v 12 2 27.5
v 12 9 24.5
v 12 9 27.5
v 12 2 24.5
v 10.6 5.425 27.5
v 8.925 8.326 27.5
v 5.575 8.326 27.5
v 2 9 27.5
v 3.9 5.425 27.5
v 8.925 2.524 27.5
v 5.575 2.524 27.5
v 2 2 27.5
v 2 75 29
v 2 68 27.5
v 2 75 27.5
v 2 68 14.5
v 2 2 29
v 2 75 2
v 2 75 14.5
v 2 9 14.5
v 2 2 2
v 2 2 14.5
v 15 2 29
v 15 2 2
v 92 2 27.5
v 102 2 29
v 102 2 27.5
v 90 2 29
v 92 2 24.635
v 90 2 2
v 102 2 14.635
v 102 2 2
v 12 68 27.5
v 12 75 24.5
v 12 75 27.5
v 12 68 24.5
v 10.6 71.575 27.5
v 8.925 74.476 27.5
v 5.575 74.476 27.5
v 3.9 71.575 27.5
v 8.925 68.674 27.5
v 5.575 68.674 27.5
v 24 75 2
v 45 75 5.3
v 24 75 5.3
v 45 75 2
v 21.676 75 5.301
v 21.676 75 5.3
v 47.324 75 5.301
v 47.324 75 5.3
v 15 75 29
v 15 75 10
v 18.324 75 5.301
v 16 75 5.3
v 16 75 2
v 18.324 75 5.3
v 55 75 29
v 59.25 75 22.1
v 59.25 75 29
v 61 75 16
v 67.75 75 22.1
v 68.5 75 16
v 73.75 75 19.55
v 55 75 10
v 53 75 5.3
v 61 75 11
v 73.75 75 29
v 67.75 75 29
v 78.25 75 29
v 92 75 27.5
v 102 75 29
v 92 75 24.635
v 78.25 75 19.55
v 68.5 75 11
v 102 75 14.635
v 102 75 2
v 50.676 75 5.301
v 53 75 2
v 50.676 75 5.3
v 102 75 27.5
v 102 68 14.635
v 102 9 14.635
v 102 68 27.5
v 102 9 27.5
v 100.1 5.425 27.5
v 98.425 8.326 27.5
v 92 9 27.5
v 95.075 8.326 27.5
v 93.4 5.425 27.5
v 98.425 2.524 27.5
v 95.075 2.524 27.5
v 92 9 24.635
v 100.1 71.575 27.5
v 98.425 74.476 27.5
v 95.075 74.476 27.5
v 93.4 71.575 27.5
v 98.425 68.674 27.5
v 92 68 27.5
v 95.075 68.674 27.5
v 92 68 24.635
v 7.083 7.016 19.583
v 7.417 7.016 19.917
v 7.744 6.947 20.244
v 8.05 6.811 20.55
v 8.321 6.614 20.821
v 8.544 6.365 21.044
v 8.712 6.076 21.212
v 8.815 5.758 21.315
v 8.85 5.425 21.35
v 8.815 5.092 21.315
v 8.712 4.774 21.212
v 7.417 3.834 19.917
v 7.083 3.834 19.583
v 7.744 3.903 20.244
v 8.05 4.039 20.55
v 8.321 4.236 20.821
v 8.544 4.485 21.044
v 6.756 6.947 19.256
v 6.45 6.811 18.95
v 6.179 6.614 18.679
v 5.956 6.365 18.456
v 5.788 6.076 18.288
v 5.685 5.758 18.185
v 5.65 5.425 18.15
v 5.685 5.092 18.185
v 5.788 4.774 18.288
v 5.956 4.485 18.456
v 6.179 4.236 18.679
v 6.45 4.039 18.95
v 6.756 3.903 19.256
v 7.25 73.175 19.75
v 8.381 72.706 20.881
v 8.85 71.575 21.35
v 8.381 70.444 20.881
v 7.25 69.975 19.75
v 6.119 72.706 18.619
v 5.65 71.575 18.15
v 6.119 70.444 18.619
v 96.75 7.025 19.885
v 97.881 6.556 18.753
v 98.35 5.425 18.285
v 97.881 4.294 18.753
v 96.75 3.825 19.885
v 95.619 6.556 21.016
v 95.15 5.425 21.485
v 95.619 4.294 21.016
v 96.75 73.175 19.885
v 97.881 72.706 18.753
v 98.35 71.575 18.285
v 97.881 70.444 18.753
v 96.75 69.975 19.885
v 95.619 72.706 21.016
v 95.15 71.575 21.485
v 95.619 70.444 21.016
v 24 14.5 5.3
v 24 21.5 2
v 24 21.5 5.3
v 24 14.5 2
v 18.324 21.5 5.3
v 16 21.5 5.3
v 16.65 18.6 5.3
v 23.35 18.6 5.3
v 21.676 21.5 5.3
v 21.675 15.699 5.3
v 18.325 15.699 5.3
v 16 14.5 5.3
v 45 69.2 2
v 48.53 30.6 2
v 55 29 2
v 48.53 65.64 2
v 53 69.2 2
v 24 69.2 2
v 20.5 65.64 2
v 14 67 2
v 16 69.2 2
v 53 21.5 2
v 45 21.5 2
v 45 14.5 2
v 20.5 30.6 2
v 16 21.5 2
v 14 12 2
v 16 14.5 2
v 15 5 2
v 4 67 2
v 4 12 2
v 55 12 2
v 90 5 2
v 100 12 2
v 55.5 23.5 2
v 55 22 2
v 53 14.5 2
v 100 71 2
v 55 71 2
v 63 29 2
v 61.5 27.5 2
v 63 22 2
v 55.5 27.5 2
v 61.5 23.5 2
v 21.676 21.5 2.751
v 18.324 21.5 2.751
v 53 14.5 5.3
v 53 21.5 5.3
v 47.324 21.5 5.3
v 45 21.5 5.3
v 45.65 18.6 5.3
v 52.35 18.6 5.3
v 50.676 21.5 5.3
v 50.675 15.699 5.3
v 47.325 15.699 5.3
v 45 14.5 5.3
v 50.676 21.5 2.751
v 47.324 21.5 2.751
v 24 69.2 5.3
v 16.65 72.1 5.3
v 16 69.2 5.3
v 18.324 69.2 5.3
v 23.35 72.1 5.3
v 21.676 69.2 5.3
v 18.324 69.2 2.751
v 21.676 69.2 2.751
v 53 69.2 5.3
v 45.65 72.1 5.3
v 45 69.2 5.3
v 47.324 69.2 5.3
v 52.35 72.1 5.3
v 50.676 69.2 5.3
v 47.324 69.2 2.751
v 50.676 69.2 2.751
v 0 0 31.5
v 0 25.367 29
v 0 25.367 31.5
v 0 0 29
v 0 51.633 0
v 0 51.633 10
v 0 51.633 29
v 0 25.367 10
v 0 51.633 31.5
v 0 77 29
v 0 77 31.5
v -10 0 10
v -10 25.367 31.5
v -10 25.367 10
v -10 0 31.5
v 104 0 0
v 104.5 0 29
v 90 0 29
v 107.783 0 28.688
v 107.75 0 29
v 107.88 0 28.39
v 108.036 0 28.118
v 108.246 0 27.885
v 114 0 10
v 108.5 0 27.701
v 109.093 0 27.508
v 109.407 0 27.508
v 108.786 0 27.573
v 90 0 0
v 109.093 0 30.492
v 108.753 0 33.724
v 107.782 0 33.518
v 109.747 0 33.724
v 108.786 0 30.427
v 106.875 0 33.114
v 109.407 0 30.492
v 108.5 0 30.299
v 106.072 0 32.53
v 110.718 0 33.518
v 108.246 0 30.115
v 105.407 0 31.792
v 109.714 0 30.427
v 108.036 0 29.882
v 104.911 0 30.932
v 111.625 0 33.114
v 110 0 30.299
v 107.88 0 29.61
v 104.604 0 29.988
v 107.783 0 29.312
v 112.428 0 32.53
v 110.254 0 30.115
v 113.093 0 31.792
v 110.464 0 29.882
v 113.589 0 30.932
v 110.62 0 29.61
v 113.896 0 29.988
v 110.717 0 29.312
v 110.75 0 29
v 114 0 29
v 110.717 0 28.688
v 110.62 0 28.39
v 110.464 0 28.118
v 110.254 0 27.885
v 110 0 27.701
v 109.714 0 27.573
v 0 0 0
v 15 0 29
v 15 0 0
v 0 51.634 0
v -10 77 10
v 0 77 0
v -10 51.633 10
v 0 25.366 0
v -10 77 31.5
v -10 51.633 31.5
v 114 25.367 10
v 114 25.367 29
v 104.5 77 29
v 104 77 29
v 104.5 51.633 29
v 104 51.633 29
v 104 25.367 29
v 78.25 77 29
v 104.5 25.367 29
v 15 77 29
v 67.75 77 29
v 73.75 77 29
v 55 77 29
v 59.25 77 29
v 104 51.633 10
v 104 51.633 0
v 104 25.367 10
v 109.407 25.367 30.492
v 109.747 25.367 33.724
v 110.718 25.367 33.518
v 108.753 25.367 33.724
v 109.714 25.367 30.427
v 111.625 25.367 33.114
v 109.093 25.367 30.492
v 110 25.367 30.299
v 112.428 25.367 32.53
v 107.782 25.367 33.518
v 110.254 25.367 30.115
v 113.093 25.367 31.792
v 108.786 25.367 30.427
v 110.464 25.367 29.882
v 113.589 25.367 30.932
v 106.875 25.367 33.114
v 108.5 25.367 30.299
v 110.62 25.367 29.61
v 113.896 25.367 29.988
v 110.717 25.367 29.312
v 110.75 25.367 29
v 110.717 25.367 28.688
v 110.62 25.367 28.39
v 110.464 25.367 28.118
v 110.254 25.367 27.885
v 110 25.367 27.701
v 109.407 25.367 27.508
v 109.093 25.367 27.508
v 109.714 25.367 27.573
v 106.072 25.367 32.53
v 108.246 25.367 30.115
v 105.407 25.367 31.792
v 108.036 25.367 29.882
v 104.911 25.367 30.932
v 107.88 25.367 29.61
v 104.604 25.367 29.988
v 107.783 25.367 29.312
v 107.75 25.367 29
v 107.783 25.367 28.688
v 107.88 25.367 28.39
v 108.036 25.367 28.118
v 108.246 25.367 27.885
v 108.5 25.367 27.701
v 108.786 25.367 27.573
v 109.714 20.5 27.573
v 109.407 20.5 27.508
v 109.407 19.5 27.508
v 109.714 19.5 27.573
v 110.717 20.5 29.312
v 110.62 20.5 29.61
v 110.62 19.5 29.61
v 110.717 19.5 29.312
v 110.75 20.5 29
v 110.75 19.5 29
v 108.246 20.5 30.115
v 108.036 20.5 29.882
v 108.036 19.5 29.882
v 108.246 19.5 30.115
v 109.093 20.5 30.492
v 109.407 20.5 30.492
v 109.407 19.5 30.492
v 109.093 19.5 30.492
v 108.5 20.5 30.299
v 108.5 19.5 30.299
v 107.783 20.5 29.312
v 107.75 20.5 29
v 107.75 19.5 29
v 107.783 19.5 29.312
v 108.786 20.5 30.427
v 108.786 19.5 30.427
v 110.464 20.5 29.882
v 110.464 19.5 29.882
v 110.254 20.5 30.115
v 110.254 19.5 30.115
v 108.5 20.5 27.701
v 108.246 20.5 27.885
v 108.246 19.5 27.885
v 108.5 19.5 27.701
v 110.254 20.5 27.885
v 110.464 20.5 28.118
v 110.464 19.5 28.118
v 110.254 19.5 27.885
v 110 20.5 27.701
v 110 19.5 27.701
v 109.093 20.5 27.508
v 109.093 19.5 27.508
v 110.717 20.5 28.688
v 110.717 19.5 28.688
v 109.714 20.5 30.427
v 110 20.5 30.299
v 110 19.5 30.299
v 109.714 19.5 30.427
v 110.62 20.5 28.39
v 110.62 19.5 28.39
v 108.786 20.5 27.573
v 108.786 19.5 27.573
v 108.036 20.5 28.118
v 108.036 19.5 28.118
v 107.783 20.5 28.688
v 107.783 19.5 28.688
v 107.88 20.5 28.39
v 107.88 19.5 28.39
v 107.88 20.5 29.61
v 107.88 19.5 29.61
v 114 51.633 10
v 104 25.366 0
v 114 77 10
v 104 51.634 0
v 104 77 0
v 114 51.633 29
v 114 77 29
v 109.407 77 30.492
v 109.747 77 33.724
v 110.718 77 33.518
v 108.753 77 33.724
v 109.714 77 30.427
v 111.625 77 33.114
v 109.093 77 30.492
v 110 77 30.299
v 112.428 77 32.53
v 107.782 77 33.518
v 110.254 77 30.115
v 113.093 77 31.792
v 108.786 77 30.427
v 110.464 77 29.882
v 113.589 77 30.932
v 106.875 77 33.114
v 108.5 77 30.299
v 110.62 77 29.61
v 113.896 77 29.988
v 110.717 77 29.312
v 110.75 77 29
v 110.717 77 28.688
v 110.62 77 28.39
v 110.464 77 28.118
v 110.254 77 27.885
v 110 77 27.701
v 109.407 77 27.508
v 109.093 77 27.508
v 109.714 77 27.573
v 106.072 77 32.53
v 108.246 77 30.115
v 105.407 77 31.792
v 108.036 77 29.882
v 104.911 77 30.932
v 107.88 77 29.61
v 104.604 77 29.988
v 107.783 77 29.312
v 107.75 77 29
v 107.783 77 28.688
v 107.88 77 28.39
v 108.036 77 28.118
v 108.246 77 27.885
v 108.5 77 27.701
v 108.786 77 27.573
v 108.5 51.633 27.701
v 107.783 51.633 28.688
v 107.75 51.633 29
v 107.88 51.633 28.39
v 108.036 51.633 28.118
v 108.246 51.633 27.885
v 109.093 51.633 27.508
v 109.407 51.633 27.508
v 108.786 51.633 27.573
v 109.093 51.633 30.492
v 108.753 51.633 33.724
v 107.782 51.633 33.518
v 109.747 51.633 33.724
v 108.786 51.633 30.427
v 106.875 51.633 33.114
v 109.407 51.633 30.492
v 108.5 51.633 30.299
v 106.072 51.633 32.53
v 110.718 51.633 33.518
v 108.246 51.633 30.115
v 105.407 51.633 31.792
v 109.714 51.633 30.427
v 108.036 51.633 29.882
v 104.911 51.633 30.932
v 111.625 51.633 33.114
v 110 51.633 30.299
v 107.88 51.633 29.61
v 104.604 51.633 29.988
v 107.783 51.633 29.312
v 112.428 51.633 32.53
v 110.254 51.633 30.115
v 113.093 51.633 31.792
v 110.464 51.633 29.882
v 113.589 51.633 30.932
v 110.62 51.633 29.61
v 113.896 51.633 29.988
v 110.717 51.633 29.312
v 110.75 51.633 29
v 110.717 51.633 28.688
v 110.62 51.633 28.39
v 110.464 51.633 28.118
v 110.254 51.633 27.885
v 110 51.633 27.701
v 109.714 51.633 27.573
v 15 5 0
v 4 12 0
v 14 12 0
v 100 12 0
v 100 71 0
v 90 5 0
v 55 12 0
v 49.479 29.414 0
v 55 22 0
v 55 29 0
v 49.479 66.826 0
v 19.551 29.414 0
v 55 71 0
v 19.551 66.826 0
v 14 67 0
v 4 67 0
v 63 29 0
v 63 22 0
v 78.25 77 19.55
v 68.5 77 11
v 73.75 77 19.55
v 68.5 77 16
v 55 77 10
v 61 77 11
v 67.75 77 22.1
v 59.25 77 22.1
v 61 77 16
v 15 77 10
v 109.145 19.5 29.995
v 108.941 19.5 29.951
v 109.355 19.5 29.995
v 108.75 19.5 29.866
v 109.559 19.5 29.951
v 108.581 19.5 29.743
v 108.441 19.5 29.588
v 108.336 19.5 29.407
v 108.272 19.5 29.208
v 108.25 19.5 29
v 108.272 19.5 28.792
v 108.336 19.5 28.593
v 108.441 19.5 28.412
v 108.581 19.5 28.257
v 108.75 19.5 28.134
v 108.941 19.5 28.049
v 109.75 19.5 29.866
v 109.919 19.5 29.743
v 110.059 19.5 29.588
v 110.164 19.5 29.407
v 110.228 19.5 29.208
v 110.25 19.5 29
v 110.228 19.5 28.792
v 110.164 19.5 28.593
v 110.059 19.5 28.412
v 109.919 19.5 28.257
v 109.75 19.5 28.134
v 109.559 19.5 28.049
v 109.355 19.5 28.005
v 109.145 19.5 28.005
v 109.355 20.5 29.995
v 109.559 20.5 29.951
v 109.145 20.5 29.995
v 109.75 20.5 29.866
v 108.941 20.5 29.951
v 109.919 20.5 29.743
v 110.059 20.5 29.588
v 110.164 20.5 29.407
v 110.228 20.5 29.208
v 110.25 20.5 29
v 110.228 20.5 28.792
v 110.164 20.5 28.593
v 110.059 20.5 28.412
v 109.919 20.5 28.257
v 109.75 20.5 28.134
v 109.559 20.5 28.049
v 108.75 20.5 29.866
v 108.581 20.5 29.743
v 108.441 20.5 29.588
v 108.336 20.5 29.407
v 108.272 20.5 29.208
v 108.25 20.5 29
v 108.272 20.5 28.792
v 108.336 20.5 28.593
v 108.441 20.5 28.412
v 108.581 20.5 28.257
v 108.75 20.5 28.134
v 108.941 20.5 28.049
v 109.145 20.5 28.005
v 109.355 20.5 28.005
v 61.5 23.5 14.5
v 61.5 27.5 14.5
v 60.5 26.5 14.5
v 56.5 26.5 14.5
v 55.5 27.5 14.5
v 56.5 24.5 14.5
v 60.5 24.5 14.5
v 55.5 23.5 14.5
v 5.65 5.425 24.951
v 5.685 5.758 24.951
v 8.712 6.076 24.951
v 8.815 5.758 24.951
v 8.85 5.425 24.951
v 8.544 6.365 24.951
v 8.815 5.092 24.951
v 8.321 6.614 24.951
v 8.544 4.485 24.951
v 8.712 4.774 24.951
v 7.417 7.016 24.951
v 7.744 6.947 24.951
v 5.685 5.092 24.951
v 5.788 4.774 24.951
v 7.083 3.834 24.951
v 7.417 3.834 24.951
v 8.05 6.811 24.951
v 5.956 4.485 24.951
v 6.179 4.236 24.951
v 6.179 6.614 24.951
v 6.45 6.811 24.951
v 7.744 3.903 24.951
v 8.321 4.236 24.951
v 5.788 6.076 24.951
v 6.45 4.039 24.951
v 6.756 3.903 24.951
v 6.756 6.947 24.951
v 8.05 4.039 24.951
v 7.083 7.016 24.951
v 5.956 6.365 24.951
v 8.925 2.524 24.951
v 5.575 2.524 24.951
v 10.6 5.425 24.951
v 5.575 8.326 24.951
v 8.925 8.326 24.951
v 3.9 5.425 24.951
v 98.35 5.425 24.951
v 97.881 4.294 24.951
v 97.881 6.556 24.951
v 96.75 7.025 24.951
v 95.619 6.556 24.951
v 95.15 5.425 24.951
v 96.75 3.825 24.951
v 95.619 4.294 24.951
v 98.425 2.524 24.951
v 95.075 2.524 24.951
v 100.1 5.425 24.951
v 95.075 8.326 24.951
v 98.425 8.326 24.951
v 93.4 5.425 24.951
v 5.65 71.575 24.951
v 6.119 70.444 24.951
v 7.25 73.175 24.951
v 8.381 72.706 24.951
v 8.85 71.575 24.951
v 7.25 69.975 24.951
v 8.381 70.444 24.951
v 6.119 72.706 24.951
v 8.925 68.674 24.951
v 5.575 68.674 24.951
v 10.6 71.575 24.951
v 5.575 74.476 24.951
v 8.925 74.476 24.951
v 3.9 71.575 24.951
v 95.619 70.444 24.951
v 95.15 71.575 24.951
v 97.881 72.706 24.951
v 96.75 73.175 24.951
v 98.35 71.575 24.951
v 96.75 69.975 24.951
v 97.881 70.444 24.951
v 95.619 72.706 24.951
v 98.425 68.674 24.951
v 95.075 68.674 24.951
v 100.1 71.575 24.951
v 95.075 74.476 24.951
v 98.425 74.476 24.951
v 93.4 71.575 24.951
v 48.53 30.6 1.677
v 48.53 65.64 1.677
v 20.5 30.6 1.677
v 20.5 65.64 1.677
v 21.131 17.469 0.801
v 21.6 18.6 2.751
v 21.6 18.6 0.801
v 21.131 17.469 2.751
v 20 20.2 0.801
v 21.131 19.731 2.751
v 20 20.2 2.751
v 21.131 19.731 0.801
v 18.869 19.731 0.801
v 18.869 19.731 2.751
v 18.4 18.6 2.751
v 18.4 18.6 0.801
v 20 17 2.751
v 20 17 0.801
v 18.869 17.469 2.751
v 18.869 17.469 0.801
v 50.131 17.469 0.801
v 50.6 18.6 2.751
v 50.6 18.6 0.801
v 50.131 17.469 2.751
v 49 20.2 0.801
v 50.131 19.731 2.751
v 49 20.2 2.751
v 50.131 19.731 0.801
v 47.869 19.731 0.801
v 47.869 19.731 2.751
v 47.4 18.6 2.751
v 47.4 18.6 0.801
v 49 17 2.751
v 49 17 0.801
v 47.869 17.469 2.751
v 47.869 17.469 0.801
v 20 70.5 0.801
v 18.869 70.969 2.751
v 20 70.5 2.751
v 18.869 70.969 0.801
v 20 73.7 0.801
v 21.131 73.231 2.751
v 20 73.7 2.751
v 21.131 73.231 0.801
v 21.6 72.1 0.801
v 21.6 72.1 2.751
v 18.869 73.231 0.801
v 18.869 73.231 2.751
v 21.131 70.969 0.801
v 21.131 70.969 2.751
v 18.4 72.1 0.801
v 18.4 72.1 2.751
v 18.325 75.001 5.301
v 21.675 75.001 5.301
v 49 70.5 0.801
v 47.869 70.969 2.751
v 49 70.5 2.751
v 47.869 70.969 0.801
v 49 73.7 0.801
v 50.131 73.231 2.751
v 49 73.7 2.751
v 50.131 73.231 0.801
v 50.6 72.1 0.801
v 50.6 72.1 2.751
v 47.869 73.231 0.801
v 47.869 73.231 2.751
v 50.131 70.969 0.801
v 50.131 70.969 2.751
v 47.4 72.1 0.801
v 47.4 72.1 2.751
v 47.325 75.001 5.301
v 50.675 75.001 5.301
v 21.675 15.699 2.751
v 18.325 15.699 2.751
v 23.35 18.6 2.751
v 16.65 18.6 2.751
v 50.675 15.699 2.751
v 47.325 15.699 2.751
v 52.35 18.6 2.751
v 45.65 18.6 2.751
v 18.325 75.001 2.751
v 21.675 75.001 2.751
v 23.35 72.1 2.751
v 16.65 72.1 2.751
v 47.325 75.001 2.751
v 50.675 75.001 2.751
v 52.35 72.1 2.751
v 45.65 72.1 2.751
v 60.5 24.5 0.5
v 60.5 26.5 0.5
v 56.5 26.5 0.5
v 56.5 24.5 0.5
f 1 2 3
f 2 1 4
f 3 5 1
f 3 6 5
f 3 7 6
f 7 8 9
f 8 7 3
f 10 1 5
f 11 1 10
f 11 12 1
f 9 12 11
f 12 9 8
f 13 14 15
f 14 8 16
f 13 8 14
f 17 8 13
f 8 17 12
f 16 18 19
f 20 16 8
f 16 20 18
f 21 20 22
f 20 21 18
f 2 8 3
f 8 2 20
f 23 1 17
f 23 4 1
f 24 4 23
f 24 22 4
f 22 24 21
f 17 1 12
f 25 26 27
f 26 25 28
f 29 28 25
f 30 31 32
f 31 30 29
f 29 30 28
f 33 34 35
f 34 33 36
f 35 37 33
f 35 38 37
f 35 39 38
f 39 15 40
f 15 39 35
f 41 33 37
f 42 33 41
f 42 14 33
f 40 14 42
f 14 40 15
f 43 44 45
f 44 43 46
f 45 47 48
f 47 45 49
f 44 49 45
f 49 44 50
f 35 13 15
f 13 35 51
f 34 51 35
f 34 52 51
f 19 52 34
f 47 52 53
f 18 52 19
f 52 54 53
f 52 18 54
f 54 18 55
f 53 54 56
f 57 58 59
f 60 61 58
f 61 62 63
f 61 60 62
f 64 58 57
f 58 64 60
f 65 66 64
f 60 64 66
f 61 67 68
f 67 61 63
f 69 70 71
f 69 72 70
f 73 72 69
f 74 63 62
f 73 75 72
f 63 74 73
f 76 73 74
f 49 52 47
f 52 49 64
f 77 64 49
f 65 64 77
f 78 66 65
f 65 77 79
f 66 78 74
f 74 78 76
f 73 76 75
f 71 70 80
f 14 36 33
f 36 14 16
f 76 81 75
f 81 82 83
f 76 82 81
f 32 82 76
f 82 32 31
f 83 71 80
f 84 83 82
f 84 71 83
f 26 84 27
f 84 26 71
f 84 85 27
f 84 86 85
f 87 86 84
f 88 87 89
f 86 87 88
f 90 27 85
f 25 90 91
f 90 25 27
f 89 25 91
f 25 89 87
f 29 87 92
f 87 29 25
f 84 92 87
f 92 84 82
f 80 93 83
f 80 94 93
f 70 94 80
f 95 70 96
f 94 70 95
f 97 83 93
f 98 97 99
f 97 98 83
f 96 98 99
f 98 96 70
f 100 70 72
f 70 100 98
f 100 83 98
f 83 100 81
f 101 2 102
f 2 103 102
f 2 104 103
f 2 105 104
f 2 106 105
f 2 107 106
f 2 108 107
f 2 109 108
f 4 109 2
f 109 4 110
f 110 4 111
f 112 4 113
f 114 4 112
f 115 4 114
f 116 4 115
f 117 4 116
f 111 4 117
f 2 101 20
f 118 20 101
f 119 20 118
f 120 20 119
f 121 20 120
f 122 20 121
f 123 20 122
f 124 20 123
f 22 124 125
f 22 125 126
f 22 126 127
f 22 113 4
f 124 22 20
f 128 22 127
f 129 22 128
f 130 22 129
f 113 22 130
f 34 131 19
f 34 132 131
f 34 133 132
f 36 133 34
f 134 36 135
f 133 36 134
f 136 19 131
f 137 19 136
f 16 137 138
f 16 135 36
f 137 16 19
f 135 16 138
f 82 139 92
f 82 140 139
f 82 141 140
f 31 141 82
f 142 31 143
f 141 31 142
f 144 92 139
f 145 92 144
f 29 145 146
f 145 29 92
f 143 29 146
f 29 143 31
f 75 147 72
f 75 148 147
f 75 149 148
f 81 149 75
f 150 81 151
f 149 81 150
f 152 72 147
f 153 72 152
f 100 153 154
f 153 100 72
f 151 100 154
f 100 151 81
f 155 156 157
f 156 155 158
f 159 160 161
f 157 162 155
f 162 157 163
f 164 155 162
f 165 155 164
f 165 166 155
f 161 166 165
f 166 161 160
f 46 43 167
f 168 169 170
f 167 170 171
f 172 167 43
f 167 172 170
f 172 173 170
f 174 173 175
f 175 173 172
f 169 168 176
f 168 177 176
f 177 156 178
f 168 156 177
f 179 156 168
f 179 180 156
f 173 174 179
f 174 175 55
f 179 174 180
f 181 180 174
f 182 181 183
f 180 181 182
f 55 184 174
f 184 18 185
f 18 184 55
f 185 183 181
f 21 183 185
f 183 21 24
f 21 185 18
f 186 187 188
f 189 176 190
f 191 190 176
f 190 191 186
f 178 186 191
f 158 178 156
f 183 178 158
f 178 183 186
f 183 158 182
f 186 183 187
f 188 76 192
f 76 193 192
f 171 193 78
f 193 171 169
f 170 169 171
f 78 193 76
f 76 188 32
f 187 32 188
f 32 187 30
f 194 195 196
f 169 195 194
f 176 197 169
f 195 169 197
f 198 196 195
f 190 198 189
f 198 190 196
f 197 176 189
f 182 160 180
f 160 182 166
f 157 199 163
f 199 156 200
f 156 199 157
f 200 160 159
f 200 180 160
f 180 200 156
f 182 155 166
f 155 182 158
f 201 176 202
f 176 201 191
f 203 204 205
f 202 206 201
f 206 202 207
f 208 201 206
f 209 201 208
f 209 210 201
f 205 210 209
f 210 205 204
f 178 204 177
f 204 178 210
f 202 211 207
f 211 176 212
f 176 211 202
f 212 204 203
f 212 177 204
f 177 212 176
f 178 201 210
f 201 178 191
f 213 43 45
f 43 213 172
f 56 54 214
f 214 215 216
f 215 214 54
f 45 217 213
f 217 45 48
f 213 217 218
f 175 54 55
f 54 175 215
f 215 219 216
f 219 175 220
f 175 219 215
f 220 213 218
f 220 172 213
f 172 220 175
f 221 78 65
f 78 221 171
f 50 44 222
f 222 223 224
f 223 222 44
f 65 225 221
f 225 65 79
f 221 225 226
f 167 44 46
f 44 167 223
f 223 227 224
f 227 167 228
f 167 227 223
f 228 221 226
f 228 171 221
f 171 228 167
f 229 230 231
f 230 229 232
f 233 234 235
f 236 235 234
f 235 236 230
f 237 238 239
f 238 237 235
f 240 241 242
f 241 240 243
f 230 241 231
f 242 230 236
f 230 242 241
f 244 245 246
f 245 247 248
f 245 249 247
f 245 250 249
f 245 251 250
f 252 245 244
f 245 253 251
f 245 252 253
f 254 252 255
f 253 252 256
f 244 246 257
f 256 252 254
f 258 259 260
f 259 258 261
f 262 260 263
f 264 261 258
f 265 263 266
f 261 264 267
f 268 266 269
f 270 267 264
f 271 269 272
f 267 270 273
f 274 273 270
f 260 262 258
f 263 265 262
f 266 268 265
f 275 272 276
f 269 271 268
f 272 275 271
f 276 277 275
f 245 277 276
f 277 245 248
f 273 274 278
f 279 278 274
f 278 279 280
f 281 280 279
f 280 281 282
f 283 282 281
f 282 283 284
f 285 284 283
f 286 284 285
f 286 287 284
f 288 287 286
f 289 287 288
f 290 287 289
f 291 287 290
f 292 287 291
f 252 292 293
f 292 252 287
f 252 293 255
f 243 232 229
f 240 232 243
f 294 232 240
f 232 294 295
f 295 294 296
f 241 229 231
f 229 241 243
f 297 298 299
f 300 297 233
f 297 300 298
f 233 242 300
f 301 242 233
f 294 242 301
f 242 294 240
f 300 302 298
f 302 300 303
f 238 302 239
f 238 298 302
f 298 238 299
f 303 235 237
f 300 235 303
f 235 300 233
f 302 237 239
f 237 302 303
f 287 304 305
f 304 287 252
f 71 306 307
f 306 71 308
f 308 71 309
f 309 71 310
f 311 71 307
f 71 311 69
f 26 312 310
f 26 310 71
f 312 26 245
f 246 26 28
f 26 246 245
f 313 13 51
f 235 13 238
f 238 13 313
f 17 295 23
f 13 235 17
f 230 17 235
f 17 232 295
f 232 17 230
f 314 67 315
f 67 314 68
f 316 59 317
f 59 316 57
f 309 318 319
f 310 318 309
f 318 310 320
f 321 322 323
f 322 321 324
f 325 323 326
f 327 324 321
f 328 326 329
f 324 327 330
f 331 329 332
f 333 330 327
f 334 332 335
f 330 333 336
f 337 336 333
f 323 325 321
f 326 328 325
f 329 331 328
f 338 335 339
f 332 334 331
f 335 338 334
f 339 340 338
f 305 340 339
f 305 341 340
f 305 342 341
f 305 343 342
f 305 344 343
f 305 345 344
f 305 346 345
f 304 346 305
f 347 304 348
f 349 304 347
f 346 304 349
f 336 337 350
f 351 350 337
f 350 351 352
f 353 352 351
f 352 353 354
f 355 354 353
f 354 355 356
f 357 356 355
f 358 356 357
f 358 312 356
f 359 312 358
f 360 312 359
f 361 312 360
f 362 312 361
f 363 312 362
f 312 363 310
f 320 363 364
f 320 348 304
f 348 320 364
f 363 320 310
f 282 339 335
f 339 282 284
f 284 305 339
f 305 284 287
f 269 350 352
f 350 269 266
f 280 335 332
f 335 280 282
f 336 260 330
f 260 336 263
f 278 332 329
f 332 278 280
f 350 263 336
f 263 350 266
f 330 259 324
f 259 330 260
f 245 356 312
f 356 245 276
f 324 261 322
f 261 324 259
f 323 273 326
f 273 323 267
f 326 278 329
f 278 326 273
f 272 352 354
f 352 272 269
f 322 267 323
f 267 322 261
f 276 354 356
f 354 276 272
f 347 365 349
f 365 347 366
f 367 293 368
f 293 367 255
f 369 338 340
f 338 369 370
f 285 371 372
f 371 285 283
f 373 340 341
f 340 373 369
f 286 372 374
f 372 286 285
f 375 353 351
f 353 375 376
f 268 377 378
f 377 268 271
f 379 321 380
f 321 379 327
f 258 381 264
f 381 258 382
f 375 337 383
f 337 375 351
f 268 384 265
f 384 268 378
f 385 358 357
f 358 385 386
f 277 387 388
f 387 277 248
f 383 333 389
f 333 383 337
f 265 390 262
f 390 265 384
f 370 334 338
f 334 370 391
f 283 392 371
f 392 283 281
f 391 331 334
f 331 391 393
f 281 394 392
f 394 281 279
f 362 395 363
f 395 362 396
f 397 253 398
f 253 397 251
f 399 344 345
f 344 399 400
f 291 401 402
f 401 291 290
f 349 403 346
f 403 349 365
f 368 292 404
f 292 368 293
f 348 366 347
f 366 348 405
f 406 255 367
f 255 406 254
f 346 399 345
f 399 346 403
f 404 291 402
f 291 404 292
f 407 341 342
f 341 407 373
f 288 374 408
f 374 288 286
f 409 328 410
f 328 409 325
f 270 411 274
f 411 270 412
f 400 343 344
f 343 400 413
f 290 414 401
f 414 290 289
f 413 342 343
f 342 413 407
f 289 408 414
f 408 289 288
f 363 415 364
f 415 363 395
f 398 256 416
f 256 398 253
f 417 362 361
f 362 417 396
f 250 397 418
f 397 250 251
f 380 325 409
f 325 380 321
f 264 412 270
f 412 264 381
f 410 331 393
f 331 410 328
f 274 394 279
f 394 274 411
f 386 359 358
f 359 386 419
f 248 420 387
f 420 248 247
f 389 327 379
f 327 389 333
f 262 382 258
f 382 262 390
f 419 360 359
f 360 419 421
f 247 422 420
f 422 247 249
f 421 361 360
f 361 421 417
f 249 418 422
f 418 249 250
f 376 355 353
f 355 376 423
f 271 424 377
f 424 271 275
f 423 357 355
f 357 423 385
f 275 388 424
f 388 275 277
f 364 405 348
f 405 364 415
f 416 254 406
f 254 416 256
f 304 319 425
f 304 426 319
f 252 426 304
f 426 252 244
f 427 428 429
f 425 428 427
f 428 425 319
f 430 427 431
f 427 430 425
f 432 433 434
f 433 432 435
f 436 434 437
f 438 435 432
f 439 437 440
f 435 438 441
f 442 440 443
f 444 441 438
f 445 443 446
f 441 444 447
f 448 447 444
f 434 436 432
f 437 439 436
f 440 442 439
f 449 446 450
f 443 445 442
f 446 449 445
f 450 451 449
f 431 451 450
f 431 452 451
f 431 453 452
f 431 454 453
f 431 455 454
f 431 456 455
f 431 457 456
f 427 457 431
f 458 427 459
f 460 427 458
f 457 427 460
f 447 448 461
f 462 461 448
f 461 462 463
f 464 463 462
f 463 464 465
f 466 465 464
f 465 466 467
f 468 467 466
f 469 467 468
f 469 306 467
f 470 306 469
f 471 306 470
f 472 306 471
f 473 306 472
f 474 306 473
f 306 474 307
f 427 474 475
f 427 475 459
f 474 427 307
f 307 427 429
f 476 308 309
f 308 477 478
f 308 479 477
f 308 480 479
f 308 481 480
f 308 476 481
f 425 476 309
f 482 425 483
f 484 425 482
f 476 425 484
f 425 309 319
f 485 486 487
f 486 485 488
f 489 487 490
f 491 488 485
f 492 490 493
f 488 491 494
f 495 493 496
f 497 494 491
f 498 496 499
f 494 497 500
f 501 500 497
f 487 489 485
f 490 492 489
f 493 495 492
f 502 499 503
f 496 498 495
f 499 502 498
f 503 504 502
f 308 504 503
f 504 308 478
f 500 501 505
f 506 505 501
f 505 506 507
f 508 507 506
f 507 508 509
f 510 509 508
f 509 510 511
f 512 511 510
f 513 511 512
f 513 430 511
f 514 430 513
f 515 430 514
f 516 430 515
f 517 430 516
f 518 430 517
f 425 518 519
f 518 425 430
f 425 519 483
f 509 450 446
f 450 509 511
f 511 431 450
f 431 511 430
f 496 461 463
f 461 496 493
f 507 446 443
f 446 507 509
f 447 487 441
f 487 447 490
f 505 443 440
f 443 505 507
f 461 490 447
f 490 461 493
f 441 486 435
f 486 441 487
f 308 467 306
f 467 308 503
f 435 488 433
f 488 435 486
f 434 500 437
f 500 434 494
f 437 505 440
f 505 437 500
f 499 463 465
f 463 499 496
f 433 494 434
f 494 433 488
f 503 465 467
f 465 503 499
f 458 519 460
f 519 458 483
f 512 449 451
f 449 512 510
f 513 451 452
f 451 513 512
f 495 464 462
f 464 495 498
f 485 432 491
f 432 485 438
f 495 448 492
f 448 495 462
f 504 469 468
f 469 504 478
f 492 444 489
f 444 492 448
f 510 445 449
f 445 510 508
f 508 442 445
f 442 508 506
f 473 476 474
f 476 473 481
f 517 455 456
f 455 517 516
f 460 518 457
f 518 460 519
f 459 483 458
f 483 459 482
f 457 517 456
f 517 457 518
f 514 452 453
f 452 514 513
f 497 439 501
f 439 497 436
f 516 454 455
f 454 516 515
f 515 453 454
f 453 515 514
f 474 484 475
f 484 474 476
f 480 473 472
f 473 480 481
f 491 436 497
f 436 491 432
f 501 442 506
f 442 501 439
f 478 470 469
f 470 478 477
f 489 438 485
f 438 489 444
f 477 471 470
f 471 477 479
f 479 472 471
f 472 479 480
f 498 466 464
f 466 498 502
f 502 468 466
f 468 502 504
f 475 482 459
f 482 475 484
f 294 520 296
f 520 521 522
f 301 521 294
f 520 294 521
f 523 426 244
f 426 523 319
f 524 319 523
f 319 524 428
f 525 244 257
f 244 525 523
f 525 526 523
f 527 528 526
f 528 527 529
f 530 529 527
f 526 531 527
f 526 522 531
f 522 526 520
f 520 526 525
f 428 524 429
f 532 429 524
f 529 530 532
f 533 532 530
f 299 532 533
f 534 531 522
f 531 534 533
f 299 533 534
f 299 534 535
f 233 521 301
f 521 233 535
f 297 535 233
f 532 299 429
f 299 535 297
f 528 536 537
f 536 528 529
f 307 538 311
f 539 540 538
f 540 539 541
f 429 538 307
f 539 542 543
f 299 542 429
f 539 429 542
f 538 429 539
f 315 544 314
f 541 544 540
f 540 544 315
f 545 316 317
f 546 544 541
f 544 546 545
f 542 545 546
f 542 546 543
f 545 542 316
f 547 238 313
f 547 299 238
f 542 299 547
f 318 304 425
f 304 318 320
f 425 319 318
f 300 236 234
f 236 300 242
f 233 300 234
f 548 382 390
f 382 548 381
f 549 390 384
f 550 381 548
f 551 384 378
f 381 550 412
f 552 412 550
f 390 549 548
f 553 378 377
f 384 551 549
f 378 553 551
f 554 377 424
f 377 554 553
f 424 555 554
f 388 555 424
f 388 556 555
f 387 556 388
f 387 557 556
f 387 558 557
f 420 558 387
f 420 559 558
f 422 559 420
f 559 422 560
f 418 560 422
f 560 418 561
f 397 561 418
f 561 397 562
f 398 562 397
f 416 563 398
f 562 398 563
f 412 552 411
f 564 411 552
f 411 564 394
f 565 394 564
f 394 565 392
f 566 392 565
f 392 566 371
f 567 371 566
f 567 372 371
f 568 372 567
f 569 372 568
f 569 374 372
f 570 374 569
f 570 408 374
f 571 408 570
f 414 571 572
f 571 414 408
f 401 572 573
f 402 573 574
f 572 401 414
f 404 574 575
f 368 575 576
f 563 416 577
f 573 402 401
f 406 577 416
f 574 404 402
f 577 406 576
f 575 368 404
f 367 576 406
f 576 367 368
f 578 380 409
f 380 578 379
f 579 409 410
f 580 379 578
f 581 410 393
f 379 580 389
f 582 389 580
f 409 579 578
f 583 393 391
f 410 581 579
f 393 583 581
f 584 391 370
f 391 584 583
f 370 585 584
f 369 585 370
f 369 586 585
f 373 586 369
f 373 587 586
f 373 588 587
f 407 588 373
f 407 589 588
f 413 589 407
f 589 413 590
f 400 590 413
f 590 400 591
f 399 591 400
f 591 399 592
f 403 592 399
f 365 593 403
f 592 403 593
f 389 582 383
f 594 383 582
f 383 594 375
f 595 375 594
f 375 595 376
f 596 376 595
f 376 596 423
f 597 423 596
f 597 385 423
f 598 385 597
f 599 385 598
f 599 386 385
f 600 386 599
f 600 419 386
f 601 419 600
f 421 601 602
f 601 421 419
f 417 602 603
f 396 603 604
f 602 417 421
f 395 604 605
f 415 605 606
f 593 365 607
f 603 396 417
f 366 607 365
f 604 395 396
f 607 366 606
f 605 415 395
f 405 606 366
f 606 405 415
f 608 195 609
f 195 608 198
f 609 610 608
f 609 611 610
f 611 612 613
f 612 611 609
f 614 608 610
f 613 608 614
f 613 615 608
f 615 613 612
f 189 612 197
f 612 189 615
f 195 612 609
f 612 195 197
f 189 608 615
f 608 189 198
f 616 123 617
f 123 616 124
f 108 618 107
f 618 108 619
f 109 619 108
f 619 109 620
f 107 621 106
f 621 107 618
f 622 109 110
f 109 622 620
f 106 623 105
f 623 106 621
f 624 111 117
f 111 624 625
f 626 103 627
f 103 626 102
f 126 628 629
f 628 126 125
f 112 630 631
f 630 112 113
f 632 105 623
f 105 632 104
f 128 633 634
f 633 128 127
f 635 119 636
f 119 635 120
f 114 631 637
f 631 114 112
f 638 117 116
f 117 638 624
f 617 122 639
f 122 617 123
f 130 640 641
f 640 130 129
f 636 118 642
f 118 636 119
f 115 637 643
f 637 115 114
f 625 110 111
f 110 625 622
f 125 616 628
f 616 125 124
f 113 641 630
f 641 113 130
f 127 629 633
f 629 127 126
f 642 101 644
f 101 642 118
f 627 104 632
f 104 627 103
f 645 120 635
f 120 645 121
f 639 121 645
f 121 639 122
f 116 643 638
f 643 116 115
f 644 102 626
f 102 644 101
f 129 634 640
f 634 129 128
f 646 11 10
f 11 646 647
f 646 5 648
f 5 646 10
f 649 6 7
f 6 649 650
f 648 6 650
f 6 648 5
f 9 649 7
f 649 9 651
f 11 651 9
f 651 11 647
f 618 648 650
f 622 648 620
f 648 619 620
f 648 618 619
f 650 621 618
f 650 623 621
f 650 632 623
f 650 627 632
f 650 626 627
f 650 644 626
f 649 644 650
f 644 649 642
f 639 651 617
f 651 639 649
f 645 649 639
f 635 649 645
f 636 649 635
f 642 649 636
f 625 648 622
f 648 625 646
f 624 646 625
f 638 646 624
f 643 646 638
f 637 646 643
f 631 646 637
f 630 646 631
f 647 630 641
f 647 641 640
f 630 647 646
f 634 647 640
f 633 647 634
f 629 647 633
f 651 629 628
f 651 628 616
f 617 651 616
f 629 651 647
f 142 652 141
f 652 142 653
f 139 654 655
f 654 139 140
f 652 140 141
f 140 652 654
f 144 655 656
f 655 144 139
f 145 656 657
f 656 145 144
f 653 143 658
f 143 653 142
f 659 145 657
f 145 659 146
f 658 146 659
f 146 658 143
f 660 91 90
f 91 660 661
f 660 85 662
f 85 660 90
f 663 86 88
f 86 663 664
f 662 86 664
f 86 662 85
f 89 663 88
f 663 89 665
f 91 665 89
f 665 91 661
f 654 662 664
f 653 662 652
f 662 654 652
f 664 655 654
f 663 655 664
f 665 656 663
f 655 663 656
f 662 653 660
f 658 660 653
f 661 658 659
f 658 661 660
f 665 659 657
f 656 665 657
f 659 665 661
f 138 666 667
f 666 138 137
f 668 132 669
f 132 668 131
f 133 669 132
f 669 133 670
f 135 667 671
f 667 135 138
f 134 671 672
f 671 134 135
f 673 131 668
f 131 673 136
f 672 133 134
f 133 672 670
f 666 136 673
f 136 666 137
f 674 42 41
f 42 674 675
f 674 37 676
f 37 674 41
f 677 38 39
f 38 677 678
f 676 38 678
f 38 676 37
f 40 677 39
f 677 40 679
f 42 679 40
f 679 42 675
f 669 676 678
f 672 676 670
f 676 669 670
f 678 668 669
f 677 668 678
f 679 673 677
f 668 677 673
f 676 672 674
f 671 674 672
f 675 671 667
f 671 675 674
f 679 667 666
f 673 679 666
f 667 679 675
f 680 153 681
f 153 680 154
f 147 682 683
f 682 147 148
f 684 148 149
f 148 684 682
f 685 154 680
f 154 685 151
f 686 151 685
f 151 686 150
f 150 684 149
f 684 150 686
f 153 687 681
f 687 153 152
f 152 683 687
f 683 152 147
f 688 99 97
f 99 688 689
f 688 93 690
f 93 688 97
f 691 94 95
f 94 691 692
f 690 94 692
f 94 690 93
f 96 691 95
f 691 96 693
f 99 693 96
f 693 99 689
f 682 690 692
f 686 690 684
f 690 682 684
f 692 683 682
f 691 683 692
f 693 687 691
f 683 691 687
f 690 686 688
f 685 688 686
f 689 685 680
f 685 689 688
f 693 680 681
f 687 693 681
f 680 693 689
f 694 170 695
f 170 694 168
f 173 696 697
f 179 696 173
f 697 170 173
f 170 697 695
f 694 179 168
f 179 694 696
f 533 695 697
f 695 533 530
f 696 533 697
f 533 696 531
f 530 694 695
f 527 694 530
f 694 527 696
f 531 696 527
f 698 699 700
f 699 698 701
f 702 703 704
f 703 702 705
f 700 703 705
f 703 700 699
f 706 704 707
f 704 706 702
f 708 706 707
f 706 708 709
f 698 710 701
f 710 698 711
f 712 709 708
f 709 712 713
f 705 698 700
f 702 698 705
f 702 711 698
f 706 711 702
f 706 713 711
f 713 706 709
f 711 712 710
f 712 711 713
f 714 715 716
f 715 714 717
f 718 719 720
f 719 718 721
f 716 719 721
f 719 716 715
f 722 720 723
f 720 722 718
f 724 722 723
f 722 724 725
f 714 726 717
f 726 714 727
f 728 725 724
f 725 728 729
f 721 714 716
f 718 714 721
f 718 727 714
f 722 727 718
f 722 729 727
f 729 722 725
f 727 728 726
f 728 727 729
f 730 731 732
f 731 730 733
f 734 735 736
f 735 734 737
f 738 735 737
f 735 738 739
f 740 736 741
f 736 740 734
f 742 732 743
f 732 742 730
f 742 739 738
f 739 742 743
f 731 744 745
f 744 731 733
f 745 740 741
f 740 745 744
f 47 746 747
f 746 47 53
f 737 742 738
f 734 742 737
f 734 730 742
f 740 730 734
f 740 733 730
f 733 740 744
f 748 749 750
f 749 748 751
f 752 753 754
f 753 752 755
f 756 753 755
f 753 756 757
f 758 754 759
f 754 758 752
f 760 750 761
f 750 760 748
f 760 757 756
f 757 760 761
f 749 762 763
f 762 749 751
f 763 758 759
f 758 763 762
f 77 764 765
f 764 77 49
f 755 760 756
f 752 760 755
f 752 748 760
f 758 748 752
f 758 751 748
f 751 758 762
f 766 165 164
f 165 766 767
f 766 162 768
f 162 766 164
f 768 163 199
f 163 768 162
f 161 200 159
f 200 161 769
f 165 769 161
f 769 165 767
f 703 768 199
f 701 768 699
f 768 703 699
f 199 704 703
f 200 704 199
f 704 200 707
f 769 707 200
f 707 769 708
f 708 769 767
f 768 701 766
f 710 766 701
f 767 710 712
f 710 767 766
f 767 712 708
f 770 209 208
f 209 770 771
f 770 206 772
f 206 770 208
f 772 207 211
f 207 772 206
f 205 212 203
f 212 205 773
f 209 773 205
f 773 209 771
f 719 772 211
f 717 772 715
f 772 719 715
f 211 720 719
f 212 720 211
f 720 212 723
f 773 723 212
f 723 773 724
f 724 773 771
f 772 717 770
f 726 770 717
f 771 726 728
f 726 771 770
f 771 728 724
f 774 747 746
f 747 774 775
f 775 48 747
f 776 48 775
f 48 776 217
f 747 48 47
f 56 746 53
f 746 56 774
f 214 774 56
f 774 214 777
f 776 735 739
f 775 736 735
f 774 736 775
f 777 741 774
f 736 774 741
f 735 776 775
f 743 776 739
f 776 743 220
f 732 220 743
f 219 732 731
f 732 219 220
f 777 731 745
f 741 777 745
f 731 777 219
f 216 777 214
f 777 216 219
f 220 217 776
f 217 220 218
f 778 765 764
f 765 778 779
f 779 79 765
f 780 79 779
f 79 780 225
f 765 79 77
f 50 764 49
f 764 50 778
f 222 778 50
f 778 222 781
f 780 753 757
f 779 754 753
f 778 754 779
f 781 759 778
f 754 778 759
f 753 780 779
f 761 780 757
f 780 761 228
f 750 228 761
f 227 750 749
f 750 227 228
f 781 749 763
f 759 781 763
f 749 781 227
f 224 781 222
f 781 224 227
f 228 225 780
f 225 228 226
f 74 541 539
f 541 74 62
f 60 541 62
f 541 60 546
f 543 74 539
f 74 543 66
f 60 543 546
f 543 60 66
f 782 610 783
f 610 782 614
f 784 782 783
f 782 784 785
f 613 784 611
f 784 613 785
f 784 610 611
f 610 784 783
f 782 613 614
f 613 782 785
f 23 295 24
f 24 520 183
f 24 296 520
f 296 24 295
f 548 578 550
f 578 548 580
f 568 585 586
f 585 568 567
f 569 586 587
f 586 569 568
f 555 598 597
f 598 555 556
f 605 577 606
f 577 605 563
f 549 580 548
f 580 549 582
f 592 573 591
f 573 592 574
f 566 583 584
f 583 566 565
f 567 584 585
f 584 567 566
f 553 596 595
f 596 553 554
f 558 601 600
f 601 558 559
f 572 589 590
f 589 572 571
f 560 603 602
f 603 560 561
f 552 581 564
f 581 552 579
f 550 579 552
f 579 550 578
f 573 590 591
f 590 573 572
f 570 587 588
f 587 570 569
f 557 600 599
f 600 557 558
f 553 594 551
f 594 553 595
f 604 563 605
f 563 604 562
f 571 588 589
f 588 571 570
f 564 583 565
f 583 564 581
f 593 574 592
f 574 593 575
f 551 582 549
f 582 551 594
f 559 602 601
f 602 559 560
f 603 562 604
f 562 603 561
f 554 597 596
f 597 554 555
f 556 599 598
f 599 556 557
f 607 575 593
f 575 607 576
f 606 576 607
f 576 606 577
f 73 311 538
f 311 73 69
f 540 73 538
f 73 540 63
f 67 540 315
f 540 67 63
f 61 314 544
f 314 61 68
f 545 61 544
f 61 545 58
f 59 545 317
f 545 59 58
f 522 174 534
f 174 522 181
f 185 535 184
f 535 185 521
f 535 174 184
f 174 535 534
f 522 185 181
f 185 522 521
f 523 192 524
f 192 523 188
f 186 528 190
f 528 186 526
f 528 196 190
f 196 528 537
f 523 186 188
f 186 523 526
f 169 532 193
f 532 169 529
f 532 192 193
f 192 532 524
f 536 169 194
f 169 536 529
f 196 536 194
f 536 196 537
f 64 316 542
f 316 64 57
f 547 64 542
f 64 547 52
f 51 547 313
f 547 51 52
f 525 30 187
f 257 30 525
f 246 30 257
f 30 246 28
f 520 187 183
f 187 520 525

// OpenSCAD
//
// ktBOX1
//
//


gap1 = 0.001;
gap2 = 0.002;

panel_thick = 2;
front_x = 95+5+panel_thick*2;
front_y = 72+1+panel_thick*2;
front_z = 25+panel_thick;
rear_x = front_x;
rear_y = front_y;
rear_z = 13+panel_thick;

hinge_x = 10;
hinge_y = front_y/3-0.3;
hinge_hole = 1.1+0.4;
hook_x = 10;
hook_y = front_y/3-0.3;
hook_z = 2.5;

board_thick = 1.5;
board_hole_x = 89.5;
board_hole_y = 66.15;

lcd_w = 28.03;
lcd_h = 35.04;
lcd_hole_x = 29;
lcd_hole_y = 53.5;
lcd_slope = 0.755;
lcd_gap = 3.3;

A = 1;
B = 0;//1;
C = 0;//1;



if( A ){
difference(){
    union(){
        //color( "Blue" )
        {
            cube( [front_x, front_y, panel_thick] );
            wall_x( 0, 0, 0, front_z );
            wall_x( 0, front_y-panel_thick, 0, front_z );
            wall_y( 0, 0, 0, front_z );
            wall_y( front_x-panel_thick, 0, 0, front_z );
            board_base( 0, 0, 0 );
            
            lcd_base( 20.5, 30.6, panel_thick );
            
            hook( -10, 0, 0, front_z );
            hook( -10, front_y-hook_y, 0, front_z );
            hinge( front_x, 0, 0, front_z );
            hinge( front_x, front_y-hinge_y, 0, front_z );
            translate( [front_x, hinge_y, 0] )
            cube( [10, front_y-hinge_y*2, 10] );
            translate( [-10, hinge_y, 0] )
            cube( [10, front_y-hinge_y*2, 10] );
            
            //stopper
            translate( [front_x+10/2+0.25, 20, front_z+panel_thick] )
            rotate( [90, 0, 0] )
            cylinder( 1, 2, 2, center=true, $fn=30 );
            
            //LED
            translate( [63.5, 0, 0] ){
                translate( [-7-1, front_y-15-37.5-1, panel_thick] )
                cube( [6, 4, 12.5] );
            }
        }
    }
    translate( [30/2, -gap1, front_z+panel_thick-10+gap1] )
    cube( [front_x-30, panel_thick+gap2, 10] );
    
    board_hole( (front_x-board_hole_x)/2, (front_y-board_hole_y)/2, front_z+panel_thick-board_thick);

    lcd_window( 20.5, 30.6 );
    lcd_hole( 20.5, 30.6, panel_thick );

    translate( [front_x+10, hinge_y-gap1, -10] )
    rotate( [0, -45, 0] )
    cube( [10*sqrt(2), front_y-hinge_y*2+gap2, 10*sqrt(2)] );
    translate( [-10, hinge_y-gap1, -10] )
    rotate( [0, -45, 0] )
    cube( [10*sqrt(2), front_y-hinge_y*2+gap2, 10*sqrt(2)] );
    
    //stopper
    translate( [front_x+10/2+0.25, 20, front_z+panel_thick] )
    rotate( [90, 0, 0] )
    cylinder( 1+gap2, 1, 1, center=true, $fn=30 );
    
    translate( [63.5, 0, 0] ){
        //USB
        translate( [1.25, front_y-panel_thick/2+gap1, 13.5] )
        cube( [7.5, panel_thick+gap2*2, 5], center=true );
        
        //SW
        /*translate( [20, front_y-10.5, panel_thick/2] ){
            cube( [10+0.6, 6, panel_thick+gap2*2], center=true );
            translate( [0, 6/2, 0] )
            rotate( [-45, 0, 0] )
            cube( [10+0.6, 6, panel_thick+gap2*2], center=true );
            translate( [0, -6/2, 0] )
            rotate( [45, 0, 0] )
            cube( [10+0.6, 6, panel_thick+gap2*2], center=true );
        }*/
        
        //LED
        translate( [-7, front_y-15-37.5, 0.5] )
        cube( [4, 2, 15] );
    }
    
    //plug rl
    translate( [76, front_y-panel_thick/2, 24.3] )
    cube( [2.5+2, 3, 9.5], center=true );
    
    //plug wd
    translate( [63.5, front_y-panel_thick/2, 25.6] )
    cube( [8.5, 3, 7], center=true );
    
    //del
    //translate( [-20, -10, -gap1] )
    //cube( [20, 100, 40] );
    translate( [4, 12, -gap1] )
    cube( [10, 55, 40] );
    translate( [55, 12, -gap1] )
    cube( [45, 10, 10] );
    translate( [55, 29, -gap1] )
    cube( [45, 42, 10] );
    translate( [63, 19, -gap1] )
    cube( [37, 13, 10] );
    //translate( [front_x, -10, -gap1] )
    //cube( [20, 100, 40] );
    translate( [15, front_y-5, 10] )
    cube( [40, 10, 40] );
    translate( [15, -5, -gap1] )
    cube( [75, 10, 40] );
}
}

if( B ){
//translate( [76.5, front_y-15+12.8, panel_thick+9.5] )
//rotate( [180, 0, 0] )
translate( [0, -20, 0] )
sw( 0, 0, 0 );
}

if( C ){
//translate( [0, front_y, front_z+rear_z+panel_thick*2] ){
//    rotate( [180, 0, 0] ){
translate( [0, 100, 0] ){
    rotate( [0, 0, 0] ){
        difference(){
            union(){
                //color( "Black" )
                {
                    cube( [front_x, front_y, panel_thick] );
                    wall_x( 0, 0, 0, rear_z );
                    wall_x( 0, front_y-panel_thick, 0, rear_z );
                    wall_y( 0, 0, 0, rear_z );
                    wall_y( front_x-panel_thick, 0, 0, rear_z );
                    
                    hook( -10, front_y/2-hook_y/2, 0, rear_z );
                    hinge( front_x, front_y/2-hinge_y/2, 0, rear_z );
                }
            }
        }
    }
}
}




module wall_x( x, y, z, h ){
    translate( [x, y, z+panel_thick] ){
        cube( [front_x, panel_thick, h] );
    }
}

module wall_y( x, y, z, h ){
    translate( [x, y, z+panel_thick] ){
        cube( [panel_thick, front_y, h] );
    }
}

module board_base( x, y, z=0 ){
    base_x = 10;
    base_y = 7;
    translate( [x, y, z] ){
        difference(){
            union(){
            translate( [panel_thick, panel_thick, panel_thick] )
            cube( [base_x, base_y, front_z-board_thick] );
            translate( [panel_thick, front_y-panel_thick-base_y, panel_thick] )
            cube( [base_x, base_y, front_z-board_thick] );
            translate( [front_x-panel_thick-10, panel_thick, panel_thick] )
            cube( [base_x, base_y, front_z-board_thick] );
            translate( [front_x-panel_thick-10, front_y-panel_thick-base_y, panel_thick] )
            cube( [base_x, base_y, front_z-board_thick] );
            }
            translate( [panel_thick-8, panel_thick-gap1, panel_thick+4.5] )
            rotate( [0, 45, 0] )
            cube( [base_x+6.5, base_y+gap2, front_z-board_thick] );
            translate( [panel_thick-8, front_y-panel_thick-base_y-gap1, panel_thick+4.5] )
            rotate( [0, 45, 0] )
            cube( [base_x+6.5, base_y+gap2, front_z-board_thick] );
            translate( [front_x-panel_thick-10+5, panel_thick-gap1, panel_thick-5.7] )
            rotate( [0, -45, 0] )
            cube( [base_x+6.5, base_y+gap2, front_z-board_thick] );
            translate( [front_x-panel_thick-10+5, front_y-panel_thick-base_y-gap1, panel_thick-5.7] )
            rotate( [0, -45, 0] )
            cube( [base_x+6.5, base_y+gap2, front_z-board_thick] );        }
    }
}
module board_hole( x, y, z=0 ){
    hole_height = 10;
    translate( [x, y, z-hole_height+gap1] ){
        translate( [0, 0, 0] )
        cylinder( hole_height, 1.6, 1.6, $fn=30 );
        translate( [0, 0, hole_height-(2.4+0.15)] )
        cylinder( 2.4+0.15, 6.5/2+0.1, 6.5/2+0.1, $fn=6 );
        translate( [board_hole_x, 0, 0] )
        cylinder( hole_height, 1.6, 1.6, $fn=8 );
        translate( [board_hole_x, 0, hole_height-(2.4+0.15)] )
        cylinder( 2.4+0.15, 6.5/2+0.1, 6.5/2+0.1, $fn=6 );
        translate( [0, board_hole_y, 0] )
        cylinder( hole_height, 1.6, 1.6, $fn=8 );
        translate( [0, board_hole_y, hole_height-(2.4+0.15)] )
        cylinder( 2.4+0.15, 6.5/2+0.1, 6.5/2+0.1, $fn=6 );
        translate( [board_hole_x, board_hole_y, 0] )
        cylinder( hole_height, 1.6, 1.6, $fn=8 );
        translate( [board_hole_x, board_hole_y, hole_height-(2.4+0.15)] )
        cylinder( 2.4+0.15, 6.5/2+0.1, 6.5/2+0.1, $fn=6 );
    }
}

module hinge( x, y, z, h ){
    translate( [x, y, z] ){
        difference(){
            union(){
                cube( [hinge_x, hinge_y, h+panel_thick] );
                translate( [hinge_x/2+0.25, hinge_y/2, h+panel_thick] )
                rotate( [90, 0, 0] )
                cylinder( hinge_y, hinge_x/2-0.25, hinge_x/2-0.25, center=true, $fn=30 );
            }
            translate( [hinge_x/2+0.25, hinge_y/2, h+panel_thick] )
            rotate( [90, 0, 0] )
            cylinder( hinge_y+gap2, hinge_hole, hinge_hole, center=true, $fn=30 );
            translate( [0, -gap1, 0] )
            rotate( [0, 45, 0] )
            cube( [hinge_x*sqrt(2), hinge_y+gap2, hinge_x*sqrt(2)] );
        }
    }
}

module hook( x, y, z, h ){
    translate( [x, y, z] ){
        difference(){
            union(){
                cube( [hook_x, hook_y, h+panel_thick] );
                translate( [0, 0, h+panel_thick] )
                cube( [hook_x, hook_y, hook_z] );
             }
            translate( [0, -gap1, -hook_x] )
            rotate( [0, -45, 0] )
            cube( [hook_x*sqrt(2), hook_y+gap2, hook_x*sqrt(2)] );
        }
    }
}


module lcd_window( x, y, z=0 ){
    translate( [x, y, z-gap1] )
    cube( [lcd_w, lcd_h, panel_thick+gap1] );
    translate( [x+lcd_w/2, y+lcd_h/2, z-gap1] )
    scale( [lcd_w*lcd_slope, lcd_h*lcd_slope, lcd_h*lcd_slope] )
    rotate( [0, 0, 45] )
    cylinder( 1, 1, 0, $fn=4 );
}
module lcd_base( x, y, z ){
    translate( [x-0.5, y-12, z] ){
        translate( [0, -0.6, lcd_gap/2] )
        cube( [8, 7, lcd_gap], center=true );
        translate( [lcd_hole_x, -0.6, lcd_gap/2] )
        cube( [8, 7, lcd_gap], center=true );
        translate( [0, lcd_hole_y+0.6, lcd_gap/2] )
        cube( [8, 7, lcd_gap], center=true );
        translate( [lcd_hole_x, lcd_hole_y+0.6, lcd_gap/2] )
        cube( [8, 7, lcd_gap], center=true );
    }
}
module lcd_hole( x, y, z ){
    translate( [x-0.5, y-12, z-1.2+gap1] ){
        cylinder( 6-1.5, 1.6, 1.6, $fn=8 );
        translate( [lcd_hole_x, 0, 0] )
        cylinder( 6-1.5, 1.6, 1.6, $fn=8 );
        translate( [0, lcd_hole_y, 0] )
        cylinder( 6-1.5, 1.6, 1.6, $fn=8 );
        translate( [lcd_hole_x, lcd_hole_y, 0] )
        cylinder( 6-1.5, 1.6, 1.6, $fn=8 );
        
        translate( [0, 0, (6-1.5)-(2.4+0.15)] )
        cylinder( 2.4+0.15, 6.5/2+0.1, 6.5/2+0.1, $fn=6 );
        translate( [lcd_hole_x, 0, (6-1.5)-(2.4+0.15)] )
        cylinder( 2.4+0.15, 6.5/2+0.1, 6.5/2+0.1, $fn=6 );
        translate( [0, lcd_hole_y, (6-1.5)-(2.4+0.15)] )
        cylinder( 2.4+0.15, 6.5/2+0.1, 6.5/2+0.1, $fn=6 );
        translate( [lcd_hole_x, lcd_hole_y, (6-1.5)-(2.4+0.15)] )
        cylinder( 2.4+0.15, 6.5/2+0.1, 6.5/2+0.1, $fn=6 );
    }
}



module sw( x, y, z=0 ){
    translate( [x, y, z] ){
        difference(){
            //color( "Black" )
            union(){
                cube( [14, 14, 9.5] );
                translate( [14/2-10/2, 14/2-4/2, 9.5] )
                cube( [10, 4, panel_thick+4] );
            }
            translate( [14/2-3.8/2, 14/2-2.5/2, 0-gap1] )
            cube( [3.8, 2.5, 2.5] );
        }
    }
}
